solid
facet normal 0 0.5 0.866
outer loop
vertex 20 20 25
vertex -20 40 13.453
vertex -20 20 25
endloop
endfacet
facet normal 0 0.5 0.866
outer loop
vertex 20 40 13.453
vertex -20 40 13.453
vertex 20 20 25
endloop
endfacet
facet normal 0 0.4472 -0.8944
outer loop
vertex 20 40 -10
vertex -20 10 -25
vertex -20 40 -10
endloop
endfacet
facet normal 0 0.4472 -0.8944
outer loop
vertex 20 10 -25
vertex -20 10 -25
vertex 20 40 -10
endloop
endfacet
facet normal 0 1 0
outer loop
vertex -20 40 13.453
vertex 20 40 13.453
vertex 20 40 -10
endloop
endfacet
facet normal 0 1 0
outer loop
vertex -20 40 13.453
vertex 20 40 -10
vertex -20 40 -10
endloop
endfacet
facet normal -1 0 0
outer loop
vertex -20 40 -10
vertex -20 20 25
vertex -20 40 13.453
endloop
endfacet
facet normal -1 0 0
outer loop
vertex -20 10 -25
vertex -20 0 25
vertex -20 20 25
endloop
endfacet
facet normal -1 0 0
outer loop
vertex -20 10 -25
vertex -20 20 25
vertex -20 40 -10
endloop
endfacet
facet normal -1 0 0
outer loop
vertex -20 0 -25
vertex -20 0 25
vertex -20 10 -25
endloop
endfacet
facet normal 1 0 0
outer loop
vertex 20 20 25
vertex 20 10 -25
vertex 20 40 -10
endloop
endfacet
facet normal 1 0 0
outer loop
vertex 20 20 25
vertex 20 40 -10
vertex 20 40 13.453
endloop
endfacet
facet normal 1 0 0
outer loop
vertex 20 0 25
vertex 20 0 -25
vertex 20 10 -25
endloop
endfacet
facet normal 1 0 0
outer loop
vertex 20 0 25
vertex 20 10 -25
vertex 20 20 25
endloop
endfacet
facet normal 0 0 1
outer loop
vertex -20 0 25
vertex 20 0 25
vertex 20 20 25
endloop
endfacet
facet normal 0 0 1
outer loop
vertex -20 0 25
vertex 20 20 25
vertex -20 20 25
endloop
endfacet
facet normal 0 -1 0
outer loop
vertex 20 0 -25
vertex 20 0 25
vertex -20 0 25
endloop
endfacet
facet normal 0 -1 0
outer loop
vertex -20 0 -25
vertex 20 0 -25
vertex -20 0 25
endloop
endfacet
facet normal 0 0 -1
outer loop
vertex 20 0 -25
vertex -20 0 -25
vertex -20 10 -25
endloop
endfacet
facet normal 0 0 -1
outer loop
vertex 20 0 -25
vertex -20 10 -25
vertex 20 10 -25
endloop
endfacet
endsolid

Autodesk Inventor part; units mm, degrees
ref_plane "YZ Plane" through (0, 0, 0) normal (1, 0, 0) x (0, 1, 0)
ref_plane "XZ Plane" through (0, 0, 0) normal (0, 1, 0) x (-1, 0, 0)
ref_plane "XY Plane" through (0, 0, 0) normal (0, 0, 1) x (1, 0, 0)
sketch "Esboço1" plane through (0, 0, 0) normal (0, 1, 0) x (-1, 0, 0)
  line L0 (20, -25) -> (-20, -25)
  line L1 (-20, -25) -> (-20, 25)
  line L2 (-20, 25) -> (20, 25)
  line L3 (20, 25) -> (20, -25)
  line L4 (20, -25) -> (-20, 25) construction
  line L5 (-20, -25) -> (20, 25) construction
  point P0 (0, 0)
  dimension "d0" = 40
  dimension "d1" = 50
extrude "Extrusão1" add sketch "Esboço1" along normal blind 40
chamfer "Chanfro1" distance 20 angle 30 1 edges at (0, 40, 25) measured on face at (-6.6667, 13.3333, 25)
chamfer "Chanfro2" distance 15 distance2 30 1 edges at (0, 40, -25) measured on face at (6.6667, 40, 0.6353)
properties part number "3D Model"
